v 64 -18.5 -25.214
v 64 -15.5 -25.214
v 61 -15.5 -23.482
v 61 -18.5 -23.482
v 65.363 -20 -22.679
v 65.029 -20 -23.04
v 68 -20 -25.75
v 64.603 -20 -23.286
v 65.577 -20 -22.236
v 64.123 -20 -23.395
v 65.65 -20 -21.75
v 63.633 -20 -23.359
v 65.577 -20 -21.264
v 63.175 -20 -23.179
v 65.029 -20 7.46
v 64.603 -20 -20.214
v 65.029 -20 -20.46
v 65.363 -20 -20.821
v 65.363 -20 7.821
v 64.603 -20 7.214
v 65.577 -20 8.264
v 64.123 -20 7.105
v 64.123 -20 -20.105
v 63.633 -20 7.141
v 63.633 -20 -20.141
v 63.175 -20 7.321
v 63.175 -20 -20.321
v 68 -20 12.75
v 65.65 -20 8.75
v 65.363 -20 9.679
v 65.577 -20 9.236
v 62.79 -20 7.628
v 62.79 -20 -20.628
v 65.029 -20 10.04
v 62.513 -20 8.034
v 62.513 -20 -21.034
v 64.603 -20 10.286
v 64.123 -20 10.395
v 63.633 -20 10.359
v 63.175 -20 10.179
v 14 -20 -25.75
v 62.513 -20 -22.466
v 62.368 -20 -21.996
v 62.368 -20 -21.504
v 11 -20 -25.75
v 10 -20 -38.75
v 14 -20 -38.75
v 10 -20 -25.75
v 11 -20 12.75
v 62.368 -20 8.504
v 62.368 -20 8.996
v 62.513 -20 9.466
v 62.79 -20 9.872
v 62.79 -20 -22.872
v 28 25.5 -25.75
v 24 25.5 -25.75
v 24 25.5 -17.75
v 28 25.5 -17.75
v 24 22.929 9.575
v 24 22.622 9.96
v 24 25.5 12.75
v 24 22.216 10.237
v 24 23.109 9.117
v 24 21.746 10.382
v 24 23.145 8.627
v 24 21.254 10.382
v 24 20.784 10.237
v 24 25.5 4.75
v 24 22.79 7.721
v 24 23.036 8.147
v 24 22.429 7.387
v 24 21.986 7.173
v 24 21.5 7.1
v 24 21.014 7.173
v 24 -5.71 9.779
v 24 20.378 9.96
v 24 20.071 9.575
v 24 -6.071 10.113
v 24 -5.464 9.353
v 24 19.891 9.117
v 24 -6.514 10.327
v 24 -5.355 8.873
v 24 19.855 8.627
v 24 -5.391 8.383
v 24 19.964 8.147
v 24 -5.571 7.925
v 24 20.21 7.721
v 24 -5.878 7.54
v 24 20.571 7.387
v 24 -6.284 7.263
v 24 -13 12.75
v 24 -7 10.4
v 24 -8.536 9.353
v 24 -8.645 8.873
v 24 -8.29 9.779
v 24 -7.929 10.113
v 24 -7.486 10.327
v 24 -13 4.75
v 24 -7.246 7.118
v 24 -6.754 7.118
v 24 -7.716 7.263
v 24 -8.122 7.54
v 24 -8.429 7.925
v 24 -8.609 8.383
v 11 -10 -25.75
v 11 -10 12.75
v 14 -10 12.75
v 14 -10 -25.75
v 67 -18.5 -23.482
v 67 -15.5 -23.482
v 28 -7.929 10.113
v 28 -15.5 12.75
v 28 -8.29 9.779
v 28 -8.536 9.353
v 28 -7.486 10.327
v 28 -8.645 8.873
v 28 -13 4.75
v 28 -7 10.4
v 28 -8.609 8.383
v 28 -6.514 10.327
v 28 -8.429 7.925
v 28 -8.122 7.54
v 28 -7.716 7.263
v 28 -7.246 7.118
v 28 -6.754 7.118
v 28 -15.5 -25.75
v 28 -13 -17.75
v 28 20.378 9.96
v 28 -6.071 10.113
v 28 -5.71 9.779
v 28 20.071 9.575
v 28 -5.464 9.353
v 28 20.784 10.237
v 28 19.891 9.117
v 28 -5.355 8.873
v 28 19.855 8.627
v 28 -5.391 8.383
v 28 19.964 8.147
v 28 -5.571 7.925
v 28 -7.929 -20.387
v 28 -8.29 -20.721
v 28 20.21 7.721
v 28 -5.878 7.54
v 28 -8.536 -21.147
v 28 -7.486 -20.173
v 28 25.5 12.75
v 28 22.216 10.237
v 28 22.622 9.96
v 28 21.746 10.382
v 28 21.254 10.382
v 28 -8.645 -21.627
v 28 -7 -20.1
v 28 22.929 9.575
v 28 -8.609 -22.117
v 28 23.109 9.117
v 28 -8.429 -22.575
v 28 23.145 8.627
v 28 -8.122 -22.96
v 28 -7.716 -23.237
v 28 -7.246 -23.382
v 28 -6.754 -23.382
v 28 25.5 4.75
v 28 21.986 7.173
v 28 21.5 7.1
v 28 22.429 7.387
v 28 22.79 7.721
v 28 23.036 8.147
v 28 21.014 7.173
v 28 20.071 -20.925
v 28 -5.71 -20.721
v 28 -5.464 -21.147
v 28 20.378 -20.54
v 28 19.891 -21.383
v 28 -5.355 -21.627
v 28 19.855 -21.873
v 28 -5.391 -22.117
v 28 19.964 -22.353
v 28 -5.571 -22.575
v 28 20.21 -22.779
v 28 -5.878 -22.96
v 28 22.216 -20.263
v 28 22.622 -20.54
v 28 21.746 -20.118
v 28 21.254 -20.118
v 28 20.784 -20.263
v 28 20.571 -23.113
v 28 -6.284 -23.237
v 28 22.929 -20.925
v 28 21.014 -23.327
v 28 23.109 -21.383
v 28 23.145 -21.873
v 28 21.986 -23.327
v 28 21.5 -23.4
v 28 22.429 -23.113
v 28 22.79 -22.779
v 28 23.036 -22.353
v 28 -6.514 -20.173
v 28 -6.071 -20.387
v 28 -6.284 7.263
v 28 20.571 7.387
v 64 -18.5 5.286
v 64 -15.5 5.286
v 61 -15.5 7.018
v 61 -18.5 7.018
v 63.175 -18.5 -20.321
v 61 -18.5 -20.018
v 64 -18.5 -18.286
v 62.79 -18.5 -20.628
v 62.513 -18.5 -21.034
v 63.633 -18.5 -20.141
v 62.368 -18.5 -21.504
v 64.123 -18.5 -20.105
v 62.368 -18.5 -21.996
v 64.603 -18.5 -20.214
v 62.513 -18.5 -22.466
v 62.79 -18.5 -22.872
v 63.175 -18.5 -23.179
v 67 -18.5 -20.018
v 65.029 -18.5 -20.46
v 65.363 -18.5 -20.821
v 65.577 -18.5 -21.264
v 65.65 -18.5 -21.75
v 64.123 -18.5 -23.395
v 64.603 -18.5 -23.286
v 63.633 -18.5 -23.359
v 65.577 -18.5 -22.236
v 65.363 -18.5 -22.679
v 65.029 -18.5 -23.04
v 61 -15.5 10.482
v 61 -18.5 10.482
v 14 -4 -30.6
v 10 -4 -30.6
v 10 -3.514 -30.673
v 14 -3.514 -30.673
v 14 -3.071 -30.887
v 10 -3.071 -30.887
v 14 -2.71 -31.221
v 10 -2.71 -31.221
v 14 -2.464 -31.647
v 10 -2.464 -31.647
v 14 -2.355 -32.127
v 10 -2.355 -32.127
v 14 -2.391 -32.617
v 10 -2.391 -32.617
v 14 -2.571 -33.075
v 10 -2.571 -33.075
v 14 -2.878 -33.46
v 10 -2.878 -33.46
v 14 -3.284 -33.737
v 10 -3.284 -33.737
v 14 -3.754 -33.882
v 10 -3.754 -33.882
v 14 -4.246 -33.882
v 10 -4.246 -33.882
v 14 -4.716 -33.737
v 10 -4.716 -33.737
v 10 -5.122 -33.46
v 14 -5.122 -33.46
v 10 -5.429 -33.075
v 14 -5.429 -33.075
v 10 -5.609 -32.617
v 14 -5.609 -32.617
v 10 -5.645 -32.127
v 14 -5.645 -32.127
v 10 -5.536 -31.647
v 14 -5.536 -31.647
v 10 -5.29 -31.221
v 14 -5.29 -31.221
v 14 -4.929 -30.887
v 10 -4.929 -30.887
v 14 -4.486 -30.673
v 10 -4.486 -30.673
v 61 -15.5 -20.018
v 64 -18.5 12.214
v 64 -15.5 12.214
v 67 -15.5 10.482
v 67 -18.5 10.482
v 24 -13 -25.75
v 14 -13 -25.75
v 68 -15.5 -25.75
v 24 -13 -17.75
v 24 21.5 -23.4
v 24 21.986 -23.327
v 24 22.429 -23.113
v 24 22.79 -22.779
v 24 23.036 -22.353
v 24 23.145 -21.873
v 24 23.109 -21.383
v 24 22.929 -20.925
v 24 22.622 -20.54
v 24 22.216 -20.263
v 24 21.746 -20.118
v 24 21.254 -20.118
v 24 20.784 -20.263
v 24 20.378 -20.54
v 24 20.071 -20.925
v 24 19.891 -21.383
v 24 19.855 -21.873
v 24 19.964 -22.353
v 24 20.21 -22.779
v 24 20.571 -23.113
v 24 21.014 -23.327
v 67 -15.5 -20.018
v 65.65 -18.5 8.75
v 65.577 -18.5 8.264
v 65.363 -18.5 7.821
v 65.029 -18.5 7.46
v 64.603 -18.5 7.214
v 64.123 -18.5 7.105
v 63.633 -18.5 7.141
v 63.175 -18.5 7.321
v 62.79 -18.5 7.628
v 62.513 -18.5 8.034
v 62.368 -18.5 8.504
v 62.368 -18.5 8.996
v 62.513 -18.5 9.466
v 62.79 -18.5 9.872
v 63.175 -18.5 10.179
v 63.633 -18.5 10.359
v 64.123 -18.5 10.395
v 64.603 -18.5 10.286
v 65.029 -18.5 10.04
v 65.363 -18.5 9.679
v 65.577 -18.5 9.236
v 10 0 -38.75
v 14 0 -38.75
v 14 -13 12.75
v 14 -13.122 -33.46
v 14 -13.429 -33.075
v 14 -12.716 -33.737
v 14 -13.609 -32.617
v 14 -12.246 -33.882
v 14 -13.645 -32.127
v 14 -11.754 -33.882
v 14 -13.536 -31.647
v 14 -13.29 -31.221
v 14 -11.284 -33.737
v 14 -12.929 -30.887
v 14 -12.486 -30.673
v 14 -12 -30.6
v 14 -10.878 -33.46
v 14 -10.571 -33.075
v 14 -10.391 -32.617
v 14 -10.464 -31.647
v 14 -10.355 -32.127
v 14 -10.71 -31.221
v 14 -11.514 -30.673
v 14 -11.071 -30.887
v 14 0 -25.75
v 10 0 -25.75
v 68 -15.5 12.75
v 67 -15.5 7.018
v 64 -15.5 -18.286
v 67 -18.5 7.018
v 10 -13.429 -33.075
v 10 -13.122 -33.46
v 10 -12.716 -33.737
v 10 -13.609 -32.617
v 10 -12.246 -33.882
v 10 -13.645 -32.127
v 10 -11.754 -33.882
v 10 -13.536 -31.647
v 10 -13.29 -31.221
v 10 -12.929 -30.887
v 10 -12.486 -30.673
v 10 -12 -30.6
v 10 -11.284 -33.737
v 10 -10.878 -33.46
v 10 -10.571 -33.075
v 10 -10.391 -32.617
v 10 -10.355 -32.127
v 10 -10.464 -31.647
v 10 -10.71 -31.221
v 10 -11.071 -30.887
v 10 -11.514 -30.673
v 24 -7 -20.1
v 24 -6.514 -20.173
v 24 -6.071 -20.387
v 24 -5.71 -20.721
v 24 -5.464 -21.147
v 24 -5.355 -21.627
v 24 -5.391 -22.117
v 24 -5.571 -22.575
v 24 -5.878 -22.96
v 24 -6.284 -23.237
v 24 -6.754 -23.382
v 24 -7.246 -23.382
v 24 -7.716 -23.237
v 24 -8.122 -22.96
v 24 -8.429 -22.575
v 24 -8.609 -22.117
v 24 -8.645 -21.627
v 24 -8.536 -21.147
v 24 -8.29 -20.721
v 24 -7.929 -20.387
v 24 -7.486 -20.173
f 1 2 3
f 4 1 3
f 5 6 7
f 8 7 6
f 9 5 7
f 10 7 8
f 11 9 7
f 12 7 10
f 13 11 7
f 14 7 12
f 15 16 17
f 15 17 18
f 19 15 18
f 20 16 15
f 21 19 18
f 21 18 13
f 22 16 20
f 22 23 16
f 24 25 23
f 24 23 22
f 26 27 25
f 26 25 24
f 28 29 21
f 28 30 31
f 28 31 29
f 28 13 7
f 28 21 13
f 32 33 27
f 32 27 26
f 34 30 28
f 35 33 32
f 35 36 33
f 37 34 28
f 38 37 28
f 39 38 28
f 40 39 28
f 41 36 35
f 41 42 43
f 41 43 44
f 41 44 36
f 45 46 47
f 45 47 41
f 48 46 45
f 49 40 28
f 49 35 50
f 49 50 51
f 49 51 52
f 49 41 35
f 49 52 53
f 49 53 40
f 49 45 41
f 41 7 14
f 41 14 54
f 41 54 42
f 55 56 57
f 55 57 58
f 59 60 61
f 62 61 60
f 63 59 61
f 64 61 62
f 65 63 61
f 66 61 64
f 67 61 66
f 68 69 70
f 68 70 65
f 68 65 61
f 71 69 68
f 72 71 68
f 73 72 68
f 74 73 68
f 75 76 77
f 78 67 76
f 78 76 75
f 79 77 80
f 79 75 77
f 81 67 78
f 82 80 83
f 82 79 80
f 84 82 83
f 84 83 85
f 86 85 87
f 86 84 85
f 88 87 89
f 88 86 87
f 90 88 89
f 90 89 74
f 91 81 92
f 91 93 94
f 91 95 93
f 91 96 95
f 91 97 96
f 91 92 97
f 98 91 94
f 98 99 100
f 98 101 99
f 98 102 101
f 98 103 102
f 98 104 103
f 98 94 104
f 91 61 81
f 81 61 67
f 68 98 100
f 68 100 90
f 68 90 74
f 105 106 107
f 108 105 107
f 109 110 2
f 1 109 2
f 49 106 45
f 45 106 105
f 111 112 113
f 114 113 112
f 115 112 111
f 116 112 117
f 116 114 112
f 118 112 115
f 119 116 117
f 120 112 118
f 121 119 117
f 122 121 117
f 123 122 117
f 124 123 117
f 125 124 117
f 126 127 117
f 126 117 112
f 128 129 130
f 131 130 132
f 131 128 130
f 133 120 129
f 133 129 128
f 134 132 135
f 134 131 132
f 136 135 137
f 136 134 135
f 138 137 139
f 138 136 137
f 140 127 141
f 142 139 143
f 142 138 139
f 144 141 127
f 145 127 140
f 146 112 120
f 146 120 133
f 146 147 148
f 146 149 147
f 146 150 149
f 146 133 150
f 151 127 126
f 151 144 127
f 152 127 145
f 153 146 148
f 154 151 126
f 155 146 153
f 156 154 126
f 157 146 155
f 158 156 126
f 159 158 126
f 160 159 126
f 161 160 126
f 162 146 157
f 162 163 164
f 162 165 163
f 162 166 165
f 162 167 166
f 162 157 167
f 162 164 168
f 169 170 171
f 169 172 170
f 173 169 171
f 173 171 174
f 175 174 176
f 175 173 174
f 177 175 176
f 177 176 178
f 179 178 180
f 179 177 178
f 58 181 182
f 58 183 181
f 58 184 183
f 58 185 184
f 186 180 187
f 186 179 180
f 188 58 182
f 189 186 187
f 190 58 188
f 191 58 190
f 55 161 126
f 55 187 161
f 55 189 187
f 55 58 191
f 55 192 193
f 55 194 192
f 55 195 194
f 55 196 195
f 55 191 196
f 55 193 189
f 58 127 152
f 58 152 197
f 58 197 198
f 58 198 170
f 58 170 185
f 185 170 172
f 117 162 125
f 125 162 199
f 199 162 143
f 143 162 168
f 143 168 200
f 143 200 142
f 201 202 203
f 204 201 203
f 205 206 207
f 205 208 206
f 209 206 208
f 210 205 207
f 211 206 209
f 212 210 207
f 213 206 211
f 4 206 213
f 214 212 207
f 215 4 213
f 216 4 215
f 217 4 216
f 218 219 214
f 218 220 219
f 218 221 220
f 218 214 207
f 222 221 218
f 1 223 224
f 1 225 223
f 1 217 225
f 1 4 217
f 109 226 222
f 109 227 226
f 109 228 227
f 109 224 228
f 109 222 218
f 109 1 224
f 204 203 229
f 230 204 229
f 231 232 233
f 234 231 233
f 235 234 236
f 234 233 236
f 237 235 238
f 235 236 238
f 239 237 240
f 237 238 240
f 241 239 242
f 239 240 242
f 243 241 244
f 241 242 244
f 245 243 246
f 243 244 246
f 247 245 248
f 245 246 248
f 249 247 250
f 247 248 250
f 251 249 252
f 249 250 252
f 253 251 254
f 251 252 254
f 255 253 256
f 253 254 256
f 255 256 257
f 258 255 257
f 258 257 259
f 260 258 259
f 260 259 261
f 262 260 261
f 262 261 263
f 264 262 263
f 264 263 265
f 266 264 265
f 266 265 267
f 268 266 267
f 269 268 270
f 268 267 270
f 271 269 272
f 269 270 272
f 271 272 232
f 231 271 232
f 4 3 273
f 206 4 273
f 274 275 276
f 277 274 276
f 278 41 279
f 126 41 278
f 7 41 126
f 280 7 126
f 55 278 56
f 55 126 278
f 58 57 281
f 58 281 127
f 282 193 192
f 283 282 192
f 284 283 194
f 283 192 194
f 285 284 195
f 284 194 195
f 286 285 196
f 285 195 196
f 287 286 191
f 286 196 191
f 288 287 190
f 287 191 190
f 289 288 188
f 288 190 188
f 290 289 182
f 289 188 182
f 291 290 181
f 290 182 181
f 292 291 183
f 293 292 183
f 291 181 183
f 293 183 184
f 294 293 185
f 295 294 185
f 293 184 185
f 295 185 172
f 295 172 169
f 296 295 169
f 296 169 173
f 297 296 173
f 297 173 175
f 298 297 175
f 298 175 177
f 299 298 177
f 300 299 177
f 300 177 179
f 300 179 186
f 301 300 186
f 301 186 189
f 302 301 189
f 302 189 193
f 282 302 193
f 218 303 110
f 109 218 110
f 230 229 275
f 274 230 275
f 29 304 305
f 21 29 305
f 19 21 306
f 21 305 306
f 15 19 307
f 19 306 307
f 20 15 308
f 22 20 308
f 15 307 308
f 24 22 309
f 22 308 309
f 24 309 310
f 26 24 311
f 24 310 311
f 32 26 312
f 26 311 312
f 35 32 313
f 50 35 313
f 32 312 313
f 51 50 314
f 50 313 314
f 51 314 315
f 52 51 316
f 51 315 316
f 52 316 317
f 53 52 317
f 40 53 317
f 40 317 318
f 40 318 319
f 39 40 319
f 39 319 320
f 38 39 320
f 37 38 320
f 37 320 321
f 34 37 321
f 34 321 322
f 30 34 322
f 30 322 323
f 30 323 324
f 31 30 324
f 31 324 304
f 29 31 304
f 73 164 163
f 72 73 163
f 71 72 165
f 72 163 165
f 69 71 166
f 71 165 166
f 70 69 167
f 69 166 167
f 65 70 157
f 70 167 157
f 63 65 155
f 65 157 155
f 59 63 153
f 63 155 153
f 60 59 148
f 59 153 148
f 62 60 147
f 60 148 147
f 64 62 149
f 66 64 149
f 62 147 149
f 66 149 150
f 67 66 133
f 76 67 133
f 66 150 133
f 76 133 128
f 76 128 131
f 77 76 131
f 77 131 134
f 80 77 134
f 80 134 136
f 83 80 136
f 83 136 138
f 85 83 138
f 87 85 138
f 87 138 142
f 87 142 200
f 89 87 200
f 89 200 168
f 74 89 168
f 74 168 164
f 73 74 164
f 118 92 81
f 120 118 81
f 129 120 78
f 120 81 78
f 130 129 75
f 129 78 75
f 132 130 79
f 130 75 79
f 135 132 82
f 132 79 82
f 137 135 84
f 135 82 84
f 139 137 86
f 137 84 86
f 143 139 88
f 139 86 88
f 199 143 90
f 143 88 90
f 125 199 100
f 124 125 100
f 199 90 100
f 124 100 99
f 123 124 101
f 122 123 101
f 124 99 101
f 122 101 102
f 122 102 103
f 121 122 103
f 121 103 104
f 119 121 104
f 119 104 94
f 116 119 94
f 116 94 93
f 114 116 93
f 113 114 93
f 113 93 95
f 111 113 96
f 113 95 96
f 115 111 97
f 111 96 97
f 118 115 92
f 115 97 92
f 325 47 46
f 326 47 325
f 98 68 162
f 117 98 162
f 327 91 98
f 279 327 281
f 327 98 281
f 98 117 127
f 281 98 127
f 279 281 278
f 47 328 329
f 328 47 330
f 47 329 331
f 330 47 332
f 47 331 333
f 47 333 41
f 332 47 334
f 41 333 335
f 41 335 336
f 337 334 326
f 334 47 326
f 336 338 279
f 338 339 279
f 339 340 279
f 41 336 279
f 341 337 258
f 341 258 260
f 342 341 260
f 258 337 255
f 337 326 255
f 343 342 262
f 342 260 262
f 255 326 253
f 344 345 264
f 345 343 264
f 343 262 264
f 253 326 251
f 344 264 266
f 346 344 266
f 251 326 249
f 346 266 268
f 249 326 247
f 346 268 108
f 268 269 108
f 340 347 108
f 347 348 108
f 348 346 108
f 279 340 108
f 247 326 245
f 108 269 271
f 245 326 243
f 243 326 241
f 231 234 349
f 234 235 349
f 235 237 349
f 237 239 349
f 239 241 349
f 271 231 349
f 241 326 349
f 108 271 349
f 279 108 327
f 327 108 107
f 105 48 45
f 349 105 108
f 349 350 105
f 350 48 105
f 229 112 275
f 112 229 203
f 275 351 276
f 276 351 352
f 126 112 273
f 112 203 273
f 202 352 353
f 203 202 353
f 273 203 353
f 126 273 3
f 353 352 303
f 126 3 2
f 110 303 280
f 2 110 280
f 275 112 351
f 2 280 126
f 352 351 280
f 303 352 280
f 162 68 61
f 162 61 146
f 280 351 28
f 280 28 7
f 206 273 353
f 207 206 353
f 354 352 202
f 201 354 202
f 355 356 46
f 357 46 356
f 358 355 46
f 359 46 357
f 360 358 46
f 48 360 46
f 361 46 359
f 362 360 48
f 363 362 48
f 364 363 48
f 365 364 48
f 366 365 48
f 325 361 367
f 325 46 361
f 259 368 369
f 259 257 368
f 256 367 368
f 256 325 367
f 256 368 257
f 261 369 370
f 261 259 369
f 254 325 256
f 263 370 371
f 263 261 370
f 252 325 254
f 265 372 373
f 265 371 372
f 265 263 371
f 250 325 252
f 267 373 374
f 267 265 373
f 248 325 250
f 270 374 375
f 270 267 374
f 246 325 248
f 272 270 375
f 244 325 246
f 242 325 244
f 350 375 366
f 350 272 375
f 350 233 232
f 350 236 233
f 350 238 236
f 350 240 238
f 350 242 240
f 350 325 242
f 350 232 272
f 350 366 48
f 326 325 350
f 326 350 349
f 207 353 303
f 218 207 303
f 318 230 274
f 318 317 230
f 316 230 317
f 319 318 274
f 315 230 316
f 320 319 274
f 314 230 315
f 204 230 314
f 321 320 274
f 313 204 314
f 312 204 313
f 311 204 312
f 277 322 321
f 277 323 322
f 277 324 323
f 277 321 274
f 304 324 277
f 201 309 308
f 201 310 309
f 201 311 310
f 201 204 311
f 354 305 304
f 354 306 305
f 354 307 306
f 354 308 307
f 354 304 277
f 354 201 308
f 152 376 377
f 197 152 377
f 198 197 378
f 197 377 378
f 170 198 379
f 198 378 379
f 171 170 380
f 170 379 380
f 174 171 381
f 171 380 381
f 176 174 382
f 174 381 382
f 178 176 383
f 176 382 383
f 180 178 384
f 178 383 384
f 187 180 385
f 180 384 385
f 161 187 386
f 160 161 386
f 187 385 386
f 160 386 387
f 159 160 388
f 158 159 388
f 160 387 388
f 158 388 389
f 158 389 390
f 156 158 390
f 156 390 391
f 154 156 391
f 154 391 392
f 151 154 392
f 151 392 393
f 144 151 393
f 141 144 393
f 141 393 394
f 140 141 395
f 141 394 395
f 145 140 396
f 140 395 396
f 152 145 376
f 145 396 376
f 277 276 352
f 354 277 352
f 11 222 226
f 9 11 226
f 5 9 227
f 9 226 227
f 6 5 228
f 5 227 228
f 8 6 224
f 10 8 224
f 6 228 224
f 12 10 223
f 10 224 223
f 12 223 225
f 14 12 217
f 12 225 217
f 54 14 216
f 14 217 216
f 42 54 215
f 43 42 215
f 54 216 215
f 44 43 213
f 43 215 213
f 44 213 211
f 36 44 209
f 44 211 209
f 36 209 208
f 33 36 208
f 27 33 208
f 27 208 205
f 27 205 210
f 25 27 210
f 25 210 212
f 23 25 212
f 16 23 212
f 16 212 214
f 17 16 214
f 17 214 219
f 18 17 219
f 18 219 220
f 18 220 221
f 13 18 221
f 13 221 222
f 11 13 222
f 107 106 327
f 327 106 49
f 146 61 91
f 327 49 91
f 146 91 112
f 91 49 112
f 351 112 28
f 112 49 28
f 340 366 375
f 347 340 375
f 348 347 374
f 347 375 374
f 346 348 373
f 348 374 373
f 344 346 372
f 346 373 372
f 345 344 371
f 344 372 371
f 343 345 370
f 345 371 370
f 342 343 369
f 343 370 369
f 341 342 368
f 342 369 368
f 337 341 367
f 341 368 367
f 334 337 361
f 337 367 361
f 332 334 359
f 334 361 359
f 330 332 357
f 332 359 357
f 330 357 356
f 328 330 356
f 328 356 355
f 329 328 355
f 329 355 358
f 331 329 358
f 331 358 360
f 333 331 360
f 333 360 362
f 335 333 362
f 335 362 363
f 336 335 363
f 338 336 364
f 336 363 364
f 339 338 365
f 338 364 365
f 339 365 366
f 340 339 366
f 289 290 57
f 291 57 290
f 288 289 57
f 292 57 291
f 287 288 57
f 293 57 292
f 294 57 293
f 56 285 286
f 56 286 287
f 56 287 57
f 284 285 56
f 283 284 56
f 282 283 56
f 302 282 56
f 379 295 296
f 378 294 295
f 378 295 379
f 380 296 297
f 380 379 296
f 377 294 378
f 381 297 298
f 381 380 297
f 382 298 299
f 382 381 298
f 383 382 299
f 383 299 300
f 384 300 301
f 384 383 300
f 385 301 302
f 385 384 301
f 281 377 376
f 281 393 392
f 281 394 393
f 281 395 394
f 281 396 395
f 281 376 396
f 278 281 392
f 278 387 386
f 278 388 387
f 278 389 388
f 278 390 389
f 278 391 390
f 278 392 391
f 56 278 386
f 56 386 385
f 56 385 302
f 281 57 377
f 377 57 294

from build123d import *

# Parameters (mm, degrees)
SKETCH1_W                 = 13
SKETCH1_H                 = 16
BOSS_EXTRUDE1_DEPTH       = 4
SKETCH2_R                 = 1.65
CUT_EXTRUDE1_DEPTH        = 10
SKETCH3_W                 = 4
SKETCH3_H                 = 13
BOSS_EXTRUDE2_DEPTH       = 4
SKETCH4_W                 = 13
SKETCH4_H                 = 4
BOSS_EXTRUDE3_DEPTH       = 60
SKETCH6_W                 = 4
SKETCH6_H                 = 21
SKETCH6_H_2               = 13
BOSS_EXTRUDE4_DEPTH       = 28
SKETCH12_W                = 4
SKETCH12_H                = 28
BOSS_EXTRUDE8_DEPTH       = 1.65
SKETCH13_W                = 4
SKETCH13_H                = 28
BOSS_EXTRUDE9_DEPTH       = 1.65
SKETCH14_W                = 4
SKETCH14_H                = 35.878399396
CUT_EXTRUDE5_DEPTH        = 24
SKETCH15_R                = 1.65
CUT_EXTRUDE6_DEPTH        = 24
SKETCH16_W                = 4
SKETCH16_H                = 11.121600604
SKETCH16_H_2              = 11.3
BOSS_EXTRUDE10_DEPTH      = 29.15
SKETCH17_R                = 1.65
CUT_EXTRUDE8_DEPTH        = 29.15
SKETCH18_W                = 22.65
SKETCH18_H                = 4
SKETCH18_W_2              = 13
BOSS_EXTRUDE11_DEPTH      = 4
SKETCH19_W                = 4
SKETCH19_H                = 20
BOSS_EXTRUDE12_DEPTH      = 40
SKETCH20_R                = 1.65
CUT_EXTRUDE9_DEPTH        = 40
SKETCH21_W                = 4
SKETCH21_H                = 30.5
BOSS_EXTRUDE13_DEPTH      = 38.5
SKETCH23_W                = 4
SKETCH23_H                = 4
BOSS_EXTRUDE14_DEPTH      = 38.5
SKETCH24_W                = 4
SKETCH24_H                = 38.5
BOSS_EXTRUDE15_DEPTH      = 3
SKETCH27_W                = 4
SKETCH27_H                = 58.3
CUT_EXTRUDE10_DEPTH       = 100
SKETCH29_W                = 38.5
SKETCH29_H                = 7
BOSS_EXTRUDE16_DEPTH      = 40
BOSS_EXTRUDE16_DEPTH_BACK = 28
SKETCH30_R                = 1.65
CUT_EXTRUDE11_DEPTH       = 40
SKETCH31_W                = 4
SKETCH31_H                = 22.5
CUT_EXTRUDE12_DEPTH       = 38.5
SKETCH32_W                = 38.5
SKETCH32_H                = 2.5
CUT_EXTRUDE13_DEPTH       = 40
SKETCH33_W                = 4
SKETCH33_H                = 8
BOSS_EXTRUDE17_DEPTH      = 8
SKETCH34_R                = 1.65
CUT_EXTRUDE14_DEPTH       = 8
SKETCH35_W                = 4
SKETCH35_H                = 43.5
BOSS_EXTRUDE18_DEPTH      = 13
CUT_EXTRUDE15_START       = -20
SKETCH36_W                = 10
SKETCH36_H                = 80
CUT_EXTRUDE15_DEPTH       = 20
SKETCH37_W                = 5
SKETCH37_H                = 7
BOSS_EXTRUDE19_DEPTH      = 4
SKETCH41_W                = 13
SKETCH41_H                = 20
BOSS_EXTRUDE20_DEPTH      = 4
SKETCH42_R                = 1.65
CUT_EXTRUDE18_DEPTH       = 4
SKETCH43_W                = 4
SKETCH43_H                = 38.5
CUT_EXTRUDE19_DEPTH       = 10
SKETCH44_W                = 8
SKETCH44_H                = 9
BOSS_EXTRUDE21_DEPTH      = 4
SKETCH45_R                = 1.65
CUT_EXTRUDE20_DEPTH       = 4
CUT_EXTRUDE21_DEPTH       = 3
SKETCH49_R                = 1.65
CUT_EXTRUDE22_DEPTH       = 5
SKETCH54_W                = 1
SKETCH54_H                = 38.5
CUT_EXTRUDE24_DEPTH       = 50


with BuildPart() as part:
    # Sketch1 → Boss-Extrude1 (new body)
    with BuildSketch(Plane(origin=(0, 0, 0), x_dir=(0, 0, -1), z_dir=(1, 0, 0))):
        with Locations((6.5, -8)):
            Rectangle(SKETCH1_W, SKETCH1_H)
    extrude(amount=BOSS_EXTRUDE1_DEPTH)

    # Sketch2 → Cut-Extrude1 (cut)
    with BuildSketch(Plane(origin=(4, 0, 0), x_dir=(0, 0, -1), z_dir=(1, 0, 0))):
        with Locations((6.5, -4)):
            Circle(SKETCH2_R)
        with Locations((6.5, -12)):
            Circle(SKETCH2_R)
    extrude(amount=-CUT_EXTRUDE1_DEPTH, mode=Mode.SUBTRACT)

    # Sketch3 → Boss-Extrude2 (add)
    with BuildSketch(Plane.XZ.offset(16)):
        with Locations((2, -6.5)):
            Rectangle(SKETCH3_W, SKETCH3_H)
    extrude(amount=BOSS_EXTRUDE2_DEPTH)

    # Sketch4 → Boss-Extrude3 (add)
    with BuildSketch(Plane(origin=(4, 0, 0), x_dir=(0, 0, -1), z_dir=(1, 0, 0))):
        with Locations((6.5, -18)):
            Rectangle(SKETCH4_W, SKETCH4_H)
    extrude(amount=BOSS_EXTRUDE3_DEPTH)

    # Sketch6 → Boss-Extrude4 (add)
    with BuildSketch(Plane(origin=(0, -16, 0), x_dir=(1, 0, 0), z_dir=(0, 1, 0))):
        with Locations((62, -10.5)):
            Rectangle(SKETCH6_W, SKETCH6_H)
        with Locations((62, 23.5)):
            Rectangle(SKETCH6_W, SKETCH6_H)
        with Locations((62, 6.5)):
            Rectangle(SKETCH6_W, SKETCH6_H_2)
    extrude(amount=BOSS_EXTRUDE4_DEPTH)

    # Sketch12 → Boss-Extrude8 (add)
    with BuildSketch(Plane(origin=(0, 0, -34), x_dir=(-1, 0, 0), z_dir=(0, 0, -1))):
        with Locations((-62, -2)):
            Rectangle(SKETCH12_W, SKETCH12_H)
    extrude(amount=BOSS_EXTRUDE8_DEPTH)

    # Sketch13 → Boss-Extrude9 (add)
    with BuildSketch(Plane.XY.offset(21)):
        with Locations((62, -2)):
            Rectangle(SKETCH13_W, SKETCH13_H)
    extrude(amount=BOSS_EXTRUDE9_DEPTH)

    # Sketch14 → Cut-Extrude5 (cut)
    with BuildSketch(Plane(origin=(0, 12, 0), x_dir=(1, 0, 0), z_dir=(0, 1, 0))):
        with Locations((62, 6.410800302)):
            Rectangle(SKETCH14_W, SKETCH14_H)
    extrude(amount=-CUT_EXTRUDE5_DEPTH, mode=Mode.SUBTRACT)

    # Sketch15 → Cut-Extrude6 (cut)
    with BuildSketch(Plane(origin=(64, 0, 0), x_dir=(0, 0, -1), z_dir=(1, 0, 0))):
        with Locations((-17, -11.5)):
            Circle(SKETCH15_R)
        with Locations((30, -11.5)):
            Circle(SKETCH15_R)
    extrude(amount=-CUT_EXTRUDE6_DEPTH, mode=Mode.SUBTRACT)

    # Sketch16 → Boss-Extrude10 (add)
    with BuildSketch(Plane(origin=(0, 12, 0), x_dir=(1, 0, 0), z_dir=(0, 1, 0))):
        with Locations((62, -17.089199698)):
            Rectangle(SKETCH16_W, SKETCH16_H)
        with Locations((62, 30)):
            Rectangle(SKETCH16_W, SKETCH16_H_2)
    extrude(amount=BOSS_EXTRUDE10_DEPTH)

    # Sketch17 → Cut-Extrude8 (cut)
    with BuildSketch(Plane(origin=(64, 0, 0), x_dir=(0, 0, -1), z_dir=(1, 0, 0))):
        with Locations((-17, 35.5)):
            Circle(SKETCH17_R)
        with Locations((30, 35.5)):
            Circle(SKETCH17_R)
    extrude(amount=-CUT_EXTRUDE8_DEPTH, mode=Mode.SUBTRACT)

    # Sketch18 → Boss-Extrude11 (add)
    with BuildSketch(Plane(origin=(64, 0, 0), x_dir=(0, 0, -1), z_dir=(1, 0, 0))):
        with Locations((-11.325, -18)):
            Rectangle(SKETCH18_W, SKETCH18_H)
        with Locations((24.325, -18)):
            Rectangle(SKETCH18_W, SKETCH18_H)
        with Locations((6.5, -18)):
            Rectangle(SKETCH18_W_2, SKETCH18_H)
    extrude(amount=-BOSS_EXTRUDE11_DEPTH)

    # Sketch19 → Boss-Extrude12 (add)
    with BuildSketch(Plane(origin=(0, 0, -13), x_dir=(-1, 0, 0), z_dir=(0, 0, -1))):
        with Locations((-2, -10)):
            Rectangle(SKETCH19_W, SKETCH19_H)
    extrude(amount=BOSS_EXTRUDE12_DEPTH)

    # Sketch20 → Cut-Extrude9 (cut)
    with BuildSketch(Plane.ZY):
        with Locations((-46.5, -4)):
            Circle(SKETCH20_R)
        with Locations((-46.5, -12)):
            Circle(SKETCH20_R)
    extrude(amount=-CUT_EXTRUDE9_DEPTH, mode=Mode.SUBTRACT)

    # Sketch21 → Boss-Extrude13 (add)
    with BuildSketch(Plane(origin=(0, -16, 0), x_dir=(1, 0, 0), z_dir=(0, 1, 0))):
        with Locations((26, 6.5)):
            Rectangle(SKETCH21_W, SKETCH21_H)
    extrude(amount=BOSS_EXTRUDE13_DEPTH)

    # Sketch23 → Boss-Extrude14 (add)
    with BuildSketch(Plane(origin=(0, 22.5, 0), x_dir=(1, 0, 0), z_dir=(0, 1, 0))):
        with Locations((26, 23.75)):
            Rectangle(SKETCH23_W, SKETCH23_H)
        with Locations((26, -10.75)):
            Rectangle(SKETCH23_W, SKETCH23_H)
    extrude(amount=-BOSS_EXTRUDE14_DEPTH)

    # Sketch24 → Boss-Extrude15 (add)
    with BuildSketch(Plane(origin=(0, 22.5, 0), x_dir=(1, 0, 0), z_dir=(0, 1, 0))):
        with Locations((26, 6.5)):
            Rectangle(SKETCH24_W, SKETCH24_H)
    extrude(amount=BOSS_EXTRUDE15_DEPTH)

    # Sketch27 → Cut-Extrude10 (cut)
    with BuildSketch(Plane.XZ.offset(20)):
        with Locations((62, -6.5)):
            Rectangle(SKETCH27_W, SKETCH27_H)
    extrude(amount=-CUT_EXTRUDE10_DEPTH, mode=Mode.SUBTRACT)

    # Sketch29 → Boss-Extrude16 (add, two sides)
    with BuildSketch(Plane(origin=(28, 0, 0), x_dir=(0, 0, -1), z_dir=(1, 0, 0))) as boss_extrude16_sk:
        with Locations((6.5, -16.5)):
            Rectangle(SKETCH29_W, SKETCH29_H)
    extrude(amount=BOSS_EXTRUDE16_DEPTH)
    extrude(boss_extrude16_sk.sketch, amount=-BOSS_EXTRUDE16_DEPTH_BACK)

    # Sketch30 → Cut-Extrude11 (cut)
    with BuildSketch(Plane.ZY.offset(-24)):
        with Locations((8.75, 21.5)):
            Circle(SKETCH30_R)
        with Locations((8.75, -9)):
            Circle(SKETCH30_R)
        with Locations((-21.75, 21.5)):
            Circle(SKETCH30_R)
        with Locations((-21.75, -9)):
            Circle(SKETCH30_R)
    extrude(amount=-CUT_EXTRUDE11_DEPTH, mode=Mode.SUBTRACT)

    # Sketch31 → Cut-Extrude12 (cut)
    with BuildSketch(Plane(origin=(0, 25.5, 0), x_dir=(1, 0, 0), z_dir=(0, 1, 0))):
        with Locations((26, 6.5)):
            Rectangle(SKETCH31_W, SKETCH31_H)
    extrude(amount=-CUT_EXTRUDE12_DEPTH, mode=Mode.SUBTRACT)

    # Sketch32 → Cut-Extrude13 (cut)
    with BuildSketch(Plane(origin=(68, 0, 0), x_dir=(0, 0, -1), z_dir=(1, 0, 0))):
        with Locations((6.5, -14.25)):
            Rectangle(SKETCH32_W, SKETCH32_H)
    extrude(amount=-CUT_EXTRUDE13_DEPTH, mode=Mode.SUBTRACT)

    # Sketch33 → Boss-Extrude17 (add)
    with BuildSketch(Plane(origin=(0, 25.5, 0), x_dir=(1, 0, 0), z_dir=(0, 1, 0))):
        with Locations((26, -8.75)):
            Rectangle(SKETCH33_W, SKETCH33_H)
        with Locations((26, 21.75)):
            Rectangle(SKETCH33_W, SKETCH33_H)
    extrude(amount=-BOSS_EXTRUDE17_DEPTH)

    # Sketch34 → Cut-Extrude14 (cut)
    with BuildSketch(Plane(origin=(28, 0, 0), x_dir=(0, 0, -1), z_dir=(1, 0, 0))):
        with Locations((-8.75, 21.5)):
            Circle(SKETCH34_R)
        with Locations((21.75, 21.5)):
            Circle(SKETCH34_R)
    extrude(amount=-CUT_EXTRUDE14_DEPTH, mode=Mode.SUBTRACT)

    # Sketch35 → Boss-Extrude18 (add)
    with BuildSketch(Plane(origin=(0, -13, 0), x_dir=(1, 0, 0), z_dir=(0, 1, 0))):
        with Locations((12, 9)):
            Rectangle(SKETCH35_W, SKETCH35_H)
    extrude(amount=BOSS_EXTRUDE18_DEPTH)

    # Sketch36 → Cut-Extrude15 (cut)
    with BuildSketch(Plane.XZ.offset(20).offset(CUT_EXTRUDE15_START)):
        with Locations((5, -27.25)):
            Rectangle(SKETCH36_W, SKETCH36_H)
    extrude(amount=CUT_EXTRUDE15_DEPTH, mode=Mode.SUBTRACT)

    # Sketch37 → Boss-Extrude19 (add)
    with BuildSketch(Plane.ZY.offset(-10)):
        with Locations((-28.25, -16.5)):
            Rectangle(SKETCH37_W, SKETCH37_H)
    extrude(amount=-BOSS_EXTRUDE19_DEPTH)

    # Sketch41 → Boss-Extrude20 (add)
    with BuildSketch(Plane(origin=(14, 0, 0), x_dir=(0, 0, -1), z_dir=(1, 0, 0))):
        with Locations((32.25, -10)):
            Rectangle(SKETCH41_W, SKETCH41_H)
    extrude(amount=-BOSS_EXTRUDE20_DEPTH)

    # Sketch42 → Cut-Extrude18 (cut)
    with BuildSketch(Plane.ZY.offset(-10)):
        with Locations((-32.25, -4)):
            Circle(SKETCH42_R)
        with Locations((-32.25, -12)):
            Circle(SKETCH42_R)
    extrude(amount=-CUT_EXTRUDE18_DEPTH, mode=Mode.SUBTRACT)

    # Sketch43 → Cut-Extrude19 (cut)
    with BuildSketch(Plane(origin=(0, 0, 0), x_dir=(1, 0, 0), z_dir=(0, 1, 0))):
        with Locations((12, 6.5)):
            Rectangle(SKETCH43_W, SKETCH43_H)
    extrude(amount=-CUT_EXTRUDE19_DEPTH, mode=Mode.SUBTRACT)

    # Sketch44 → Boss-Extrude21 (add)
    with BuildSketch(Plane(origin=(28, 0, 0), x_dir=(0, 0, -1), z_dir=(1, 0, 0))):
        with Locations((-8.75, -11)):
            Rectangle(SKETCH44_W, SKETCH44_H)
        with Locations((21.75, -11)):
            Rectangle(SKETCH44_W, SKETCH44_H)
    extrude(amount=-BOSS_EXTRUDE21_DEPTH)

    # Sketch45 → Cut-Extrude20 (cut)
    with BuildSketch(Plane.ZY.offset(-24)):
        with Locations((-21.75, -7)):
            Circle(SKETCH45_R)
        with Locations((8.75, -7)):
            Circle(SKETCH45_R)
    extrude(amount=-CUT_EXTRUDE20_DEPTH, mode=Mode.SUBTRACT)

    # Sketch46 → Cut-Extrude21 (cut)
    with BuildSketch(Plane(origin=(0, -15.5, 0), x_dir=(1, 0, 0), z_dir=(0, 1, 0))):
        Polygon((64, 18.285898385), (67, 20.017949192), (67, 23.482050808), (64, 25.214101615), (61, 23.482050808), (61, 20.017949192), align=None)
        Polygon((64, -12.214101615), (67, -10.482050808), (67, -7.017949192), (64, -5.285898385), (61, -7.017949192), (61, -10.482050808), align=None)
    extrude(amount=-CUT_EXTRUDE21_DEPTH, mode=Mode.SUBTRACT)

    # Sketch49 → Cut-Extrude22 (cut)
    with BuildSketch(Plane(origin=(0, -15.5, 0), x_dir=(1, 0, 0), z_dir=(0, 1, 0))):
        with Locations((64, 21.75)):
            Circle(SKETCH49_R)
        with Locations((64, -8.75)):
            Circle(SKETCH49_R)
    extrude(amount=-CUT_EXTRUDE22_DEPTH, mode=Mode.SUBTRACT)

    # Sketch54 → Cut-Extrude24 (cut)
    with BuildSketch(Plane(origin=(0, -10, 0), x_dir=(1, 0, 0), z_dir=(0, 1, 0))):
        with Locations((10.5, 6.5)):
            Rectangle(SKETCH54_W, SKETCH54_H)
    extrude(amount=-CUT_EXTRUDE24_DEPTH, mode=Mode.SUBTRACT)


solid = part.part
